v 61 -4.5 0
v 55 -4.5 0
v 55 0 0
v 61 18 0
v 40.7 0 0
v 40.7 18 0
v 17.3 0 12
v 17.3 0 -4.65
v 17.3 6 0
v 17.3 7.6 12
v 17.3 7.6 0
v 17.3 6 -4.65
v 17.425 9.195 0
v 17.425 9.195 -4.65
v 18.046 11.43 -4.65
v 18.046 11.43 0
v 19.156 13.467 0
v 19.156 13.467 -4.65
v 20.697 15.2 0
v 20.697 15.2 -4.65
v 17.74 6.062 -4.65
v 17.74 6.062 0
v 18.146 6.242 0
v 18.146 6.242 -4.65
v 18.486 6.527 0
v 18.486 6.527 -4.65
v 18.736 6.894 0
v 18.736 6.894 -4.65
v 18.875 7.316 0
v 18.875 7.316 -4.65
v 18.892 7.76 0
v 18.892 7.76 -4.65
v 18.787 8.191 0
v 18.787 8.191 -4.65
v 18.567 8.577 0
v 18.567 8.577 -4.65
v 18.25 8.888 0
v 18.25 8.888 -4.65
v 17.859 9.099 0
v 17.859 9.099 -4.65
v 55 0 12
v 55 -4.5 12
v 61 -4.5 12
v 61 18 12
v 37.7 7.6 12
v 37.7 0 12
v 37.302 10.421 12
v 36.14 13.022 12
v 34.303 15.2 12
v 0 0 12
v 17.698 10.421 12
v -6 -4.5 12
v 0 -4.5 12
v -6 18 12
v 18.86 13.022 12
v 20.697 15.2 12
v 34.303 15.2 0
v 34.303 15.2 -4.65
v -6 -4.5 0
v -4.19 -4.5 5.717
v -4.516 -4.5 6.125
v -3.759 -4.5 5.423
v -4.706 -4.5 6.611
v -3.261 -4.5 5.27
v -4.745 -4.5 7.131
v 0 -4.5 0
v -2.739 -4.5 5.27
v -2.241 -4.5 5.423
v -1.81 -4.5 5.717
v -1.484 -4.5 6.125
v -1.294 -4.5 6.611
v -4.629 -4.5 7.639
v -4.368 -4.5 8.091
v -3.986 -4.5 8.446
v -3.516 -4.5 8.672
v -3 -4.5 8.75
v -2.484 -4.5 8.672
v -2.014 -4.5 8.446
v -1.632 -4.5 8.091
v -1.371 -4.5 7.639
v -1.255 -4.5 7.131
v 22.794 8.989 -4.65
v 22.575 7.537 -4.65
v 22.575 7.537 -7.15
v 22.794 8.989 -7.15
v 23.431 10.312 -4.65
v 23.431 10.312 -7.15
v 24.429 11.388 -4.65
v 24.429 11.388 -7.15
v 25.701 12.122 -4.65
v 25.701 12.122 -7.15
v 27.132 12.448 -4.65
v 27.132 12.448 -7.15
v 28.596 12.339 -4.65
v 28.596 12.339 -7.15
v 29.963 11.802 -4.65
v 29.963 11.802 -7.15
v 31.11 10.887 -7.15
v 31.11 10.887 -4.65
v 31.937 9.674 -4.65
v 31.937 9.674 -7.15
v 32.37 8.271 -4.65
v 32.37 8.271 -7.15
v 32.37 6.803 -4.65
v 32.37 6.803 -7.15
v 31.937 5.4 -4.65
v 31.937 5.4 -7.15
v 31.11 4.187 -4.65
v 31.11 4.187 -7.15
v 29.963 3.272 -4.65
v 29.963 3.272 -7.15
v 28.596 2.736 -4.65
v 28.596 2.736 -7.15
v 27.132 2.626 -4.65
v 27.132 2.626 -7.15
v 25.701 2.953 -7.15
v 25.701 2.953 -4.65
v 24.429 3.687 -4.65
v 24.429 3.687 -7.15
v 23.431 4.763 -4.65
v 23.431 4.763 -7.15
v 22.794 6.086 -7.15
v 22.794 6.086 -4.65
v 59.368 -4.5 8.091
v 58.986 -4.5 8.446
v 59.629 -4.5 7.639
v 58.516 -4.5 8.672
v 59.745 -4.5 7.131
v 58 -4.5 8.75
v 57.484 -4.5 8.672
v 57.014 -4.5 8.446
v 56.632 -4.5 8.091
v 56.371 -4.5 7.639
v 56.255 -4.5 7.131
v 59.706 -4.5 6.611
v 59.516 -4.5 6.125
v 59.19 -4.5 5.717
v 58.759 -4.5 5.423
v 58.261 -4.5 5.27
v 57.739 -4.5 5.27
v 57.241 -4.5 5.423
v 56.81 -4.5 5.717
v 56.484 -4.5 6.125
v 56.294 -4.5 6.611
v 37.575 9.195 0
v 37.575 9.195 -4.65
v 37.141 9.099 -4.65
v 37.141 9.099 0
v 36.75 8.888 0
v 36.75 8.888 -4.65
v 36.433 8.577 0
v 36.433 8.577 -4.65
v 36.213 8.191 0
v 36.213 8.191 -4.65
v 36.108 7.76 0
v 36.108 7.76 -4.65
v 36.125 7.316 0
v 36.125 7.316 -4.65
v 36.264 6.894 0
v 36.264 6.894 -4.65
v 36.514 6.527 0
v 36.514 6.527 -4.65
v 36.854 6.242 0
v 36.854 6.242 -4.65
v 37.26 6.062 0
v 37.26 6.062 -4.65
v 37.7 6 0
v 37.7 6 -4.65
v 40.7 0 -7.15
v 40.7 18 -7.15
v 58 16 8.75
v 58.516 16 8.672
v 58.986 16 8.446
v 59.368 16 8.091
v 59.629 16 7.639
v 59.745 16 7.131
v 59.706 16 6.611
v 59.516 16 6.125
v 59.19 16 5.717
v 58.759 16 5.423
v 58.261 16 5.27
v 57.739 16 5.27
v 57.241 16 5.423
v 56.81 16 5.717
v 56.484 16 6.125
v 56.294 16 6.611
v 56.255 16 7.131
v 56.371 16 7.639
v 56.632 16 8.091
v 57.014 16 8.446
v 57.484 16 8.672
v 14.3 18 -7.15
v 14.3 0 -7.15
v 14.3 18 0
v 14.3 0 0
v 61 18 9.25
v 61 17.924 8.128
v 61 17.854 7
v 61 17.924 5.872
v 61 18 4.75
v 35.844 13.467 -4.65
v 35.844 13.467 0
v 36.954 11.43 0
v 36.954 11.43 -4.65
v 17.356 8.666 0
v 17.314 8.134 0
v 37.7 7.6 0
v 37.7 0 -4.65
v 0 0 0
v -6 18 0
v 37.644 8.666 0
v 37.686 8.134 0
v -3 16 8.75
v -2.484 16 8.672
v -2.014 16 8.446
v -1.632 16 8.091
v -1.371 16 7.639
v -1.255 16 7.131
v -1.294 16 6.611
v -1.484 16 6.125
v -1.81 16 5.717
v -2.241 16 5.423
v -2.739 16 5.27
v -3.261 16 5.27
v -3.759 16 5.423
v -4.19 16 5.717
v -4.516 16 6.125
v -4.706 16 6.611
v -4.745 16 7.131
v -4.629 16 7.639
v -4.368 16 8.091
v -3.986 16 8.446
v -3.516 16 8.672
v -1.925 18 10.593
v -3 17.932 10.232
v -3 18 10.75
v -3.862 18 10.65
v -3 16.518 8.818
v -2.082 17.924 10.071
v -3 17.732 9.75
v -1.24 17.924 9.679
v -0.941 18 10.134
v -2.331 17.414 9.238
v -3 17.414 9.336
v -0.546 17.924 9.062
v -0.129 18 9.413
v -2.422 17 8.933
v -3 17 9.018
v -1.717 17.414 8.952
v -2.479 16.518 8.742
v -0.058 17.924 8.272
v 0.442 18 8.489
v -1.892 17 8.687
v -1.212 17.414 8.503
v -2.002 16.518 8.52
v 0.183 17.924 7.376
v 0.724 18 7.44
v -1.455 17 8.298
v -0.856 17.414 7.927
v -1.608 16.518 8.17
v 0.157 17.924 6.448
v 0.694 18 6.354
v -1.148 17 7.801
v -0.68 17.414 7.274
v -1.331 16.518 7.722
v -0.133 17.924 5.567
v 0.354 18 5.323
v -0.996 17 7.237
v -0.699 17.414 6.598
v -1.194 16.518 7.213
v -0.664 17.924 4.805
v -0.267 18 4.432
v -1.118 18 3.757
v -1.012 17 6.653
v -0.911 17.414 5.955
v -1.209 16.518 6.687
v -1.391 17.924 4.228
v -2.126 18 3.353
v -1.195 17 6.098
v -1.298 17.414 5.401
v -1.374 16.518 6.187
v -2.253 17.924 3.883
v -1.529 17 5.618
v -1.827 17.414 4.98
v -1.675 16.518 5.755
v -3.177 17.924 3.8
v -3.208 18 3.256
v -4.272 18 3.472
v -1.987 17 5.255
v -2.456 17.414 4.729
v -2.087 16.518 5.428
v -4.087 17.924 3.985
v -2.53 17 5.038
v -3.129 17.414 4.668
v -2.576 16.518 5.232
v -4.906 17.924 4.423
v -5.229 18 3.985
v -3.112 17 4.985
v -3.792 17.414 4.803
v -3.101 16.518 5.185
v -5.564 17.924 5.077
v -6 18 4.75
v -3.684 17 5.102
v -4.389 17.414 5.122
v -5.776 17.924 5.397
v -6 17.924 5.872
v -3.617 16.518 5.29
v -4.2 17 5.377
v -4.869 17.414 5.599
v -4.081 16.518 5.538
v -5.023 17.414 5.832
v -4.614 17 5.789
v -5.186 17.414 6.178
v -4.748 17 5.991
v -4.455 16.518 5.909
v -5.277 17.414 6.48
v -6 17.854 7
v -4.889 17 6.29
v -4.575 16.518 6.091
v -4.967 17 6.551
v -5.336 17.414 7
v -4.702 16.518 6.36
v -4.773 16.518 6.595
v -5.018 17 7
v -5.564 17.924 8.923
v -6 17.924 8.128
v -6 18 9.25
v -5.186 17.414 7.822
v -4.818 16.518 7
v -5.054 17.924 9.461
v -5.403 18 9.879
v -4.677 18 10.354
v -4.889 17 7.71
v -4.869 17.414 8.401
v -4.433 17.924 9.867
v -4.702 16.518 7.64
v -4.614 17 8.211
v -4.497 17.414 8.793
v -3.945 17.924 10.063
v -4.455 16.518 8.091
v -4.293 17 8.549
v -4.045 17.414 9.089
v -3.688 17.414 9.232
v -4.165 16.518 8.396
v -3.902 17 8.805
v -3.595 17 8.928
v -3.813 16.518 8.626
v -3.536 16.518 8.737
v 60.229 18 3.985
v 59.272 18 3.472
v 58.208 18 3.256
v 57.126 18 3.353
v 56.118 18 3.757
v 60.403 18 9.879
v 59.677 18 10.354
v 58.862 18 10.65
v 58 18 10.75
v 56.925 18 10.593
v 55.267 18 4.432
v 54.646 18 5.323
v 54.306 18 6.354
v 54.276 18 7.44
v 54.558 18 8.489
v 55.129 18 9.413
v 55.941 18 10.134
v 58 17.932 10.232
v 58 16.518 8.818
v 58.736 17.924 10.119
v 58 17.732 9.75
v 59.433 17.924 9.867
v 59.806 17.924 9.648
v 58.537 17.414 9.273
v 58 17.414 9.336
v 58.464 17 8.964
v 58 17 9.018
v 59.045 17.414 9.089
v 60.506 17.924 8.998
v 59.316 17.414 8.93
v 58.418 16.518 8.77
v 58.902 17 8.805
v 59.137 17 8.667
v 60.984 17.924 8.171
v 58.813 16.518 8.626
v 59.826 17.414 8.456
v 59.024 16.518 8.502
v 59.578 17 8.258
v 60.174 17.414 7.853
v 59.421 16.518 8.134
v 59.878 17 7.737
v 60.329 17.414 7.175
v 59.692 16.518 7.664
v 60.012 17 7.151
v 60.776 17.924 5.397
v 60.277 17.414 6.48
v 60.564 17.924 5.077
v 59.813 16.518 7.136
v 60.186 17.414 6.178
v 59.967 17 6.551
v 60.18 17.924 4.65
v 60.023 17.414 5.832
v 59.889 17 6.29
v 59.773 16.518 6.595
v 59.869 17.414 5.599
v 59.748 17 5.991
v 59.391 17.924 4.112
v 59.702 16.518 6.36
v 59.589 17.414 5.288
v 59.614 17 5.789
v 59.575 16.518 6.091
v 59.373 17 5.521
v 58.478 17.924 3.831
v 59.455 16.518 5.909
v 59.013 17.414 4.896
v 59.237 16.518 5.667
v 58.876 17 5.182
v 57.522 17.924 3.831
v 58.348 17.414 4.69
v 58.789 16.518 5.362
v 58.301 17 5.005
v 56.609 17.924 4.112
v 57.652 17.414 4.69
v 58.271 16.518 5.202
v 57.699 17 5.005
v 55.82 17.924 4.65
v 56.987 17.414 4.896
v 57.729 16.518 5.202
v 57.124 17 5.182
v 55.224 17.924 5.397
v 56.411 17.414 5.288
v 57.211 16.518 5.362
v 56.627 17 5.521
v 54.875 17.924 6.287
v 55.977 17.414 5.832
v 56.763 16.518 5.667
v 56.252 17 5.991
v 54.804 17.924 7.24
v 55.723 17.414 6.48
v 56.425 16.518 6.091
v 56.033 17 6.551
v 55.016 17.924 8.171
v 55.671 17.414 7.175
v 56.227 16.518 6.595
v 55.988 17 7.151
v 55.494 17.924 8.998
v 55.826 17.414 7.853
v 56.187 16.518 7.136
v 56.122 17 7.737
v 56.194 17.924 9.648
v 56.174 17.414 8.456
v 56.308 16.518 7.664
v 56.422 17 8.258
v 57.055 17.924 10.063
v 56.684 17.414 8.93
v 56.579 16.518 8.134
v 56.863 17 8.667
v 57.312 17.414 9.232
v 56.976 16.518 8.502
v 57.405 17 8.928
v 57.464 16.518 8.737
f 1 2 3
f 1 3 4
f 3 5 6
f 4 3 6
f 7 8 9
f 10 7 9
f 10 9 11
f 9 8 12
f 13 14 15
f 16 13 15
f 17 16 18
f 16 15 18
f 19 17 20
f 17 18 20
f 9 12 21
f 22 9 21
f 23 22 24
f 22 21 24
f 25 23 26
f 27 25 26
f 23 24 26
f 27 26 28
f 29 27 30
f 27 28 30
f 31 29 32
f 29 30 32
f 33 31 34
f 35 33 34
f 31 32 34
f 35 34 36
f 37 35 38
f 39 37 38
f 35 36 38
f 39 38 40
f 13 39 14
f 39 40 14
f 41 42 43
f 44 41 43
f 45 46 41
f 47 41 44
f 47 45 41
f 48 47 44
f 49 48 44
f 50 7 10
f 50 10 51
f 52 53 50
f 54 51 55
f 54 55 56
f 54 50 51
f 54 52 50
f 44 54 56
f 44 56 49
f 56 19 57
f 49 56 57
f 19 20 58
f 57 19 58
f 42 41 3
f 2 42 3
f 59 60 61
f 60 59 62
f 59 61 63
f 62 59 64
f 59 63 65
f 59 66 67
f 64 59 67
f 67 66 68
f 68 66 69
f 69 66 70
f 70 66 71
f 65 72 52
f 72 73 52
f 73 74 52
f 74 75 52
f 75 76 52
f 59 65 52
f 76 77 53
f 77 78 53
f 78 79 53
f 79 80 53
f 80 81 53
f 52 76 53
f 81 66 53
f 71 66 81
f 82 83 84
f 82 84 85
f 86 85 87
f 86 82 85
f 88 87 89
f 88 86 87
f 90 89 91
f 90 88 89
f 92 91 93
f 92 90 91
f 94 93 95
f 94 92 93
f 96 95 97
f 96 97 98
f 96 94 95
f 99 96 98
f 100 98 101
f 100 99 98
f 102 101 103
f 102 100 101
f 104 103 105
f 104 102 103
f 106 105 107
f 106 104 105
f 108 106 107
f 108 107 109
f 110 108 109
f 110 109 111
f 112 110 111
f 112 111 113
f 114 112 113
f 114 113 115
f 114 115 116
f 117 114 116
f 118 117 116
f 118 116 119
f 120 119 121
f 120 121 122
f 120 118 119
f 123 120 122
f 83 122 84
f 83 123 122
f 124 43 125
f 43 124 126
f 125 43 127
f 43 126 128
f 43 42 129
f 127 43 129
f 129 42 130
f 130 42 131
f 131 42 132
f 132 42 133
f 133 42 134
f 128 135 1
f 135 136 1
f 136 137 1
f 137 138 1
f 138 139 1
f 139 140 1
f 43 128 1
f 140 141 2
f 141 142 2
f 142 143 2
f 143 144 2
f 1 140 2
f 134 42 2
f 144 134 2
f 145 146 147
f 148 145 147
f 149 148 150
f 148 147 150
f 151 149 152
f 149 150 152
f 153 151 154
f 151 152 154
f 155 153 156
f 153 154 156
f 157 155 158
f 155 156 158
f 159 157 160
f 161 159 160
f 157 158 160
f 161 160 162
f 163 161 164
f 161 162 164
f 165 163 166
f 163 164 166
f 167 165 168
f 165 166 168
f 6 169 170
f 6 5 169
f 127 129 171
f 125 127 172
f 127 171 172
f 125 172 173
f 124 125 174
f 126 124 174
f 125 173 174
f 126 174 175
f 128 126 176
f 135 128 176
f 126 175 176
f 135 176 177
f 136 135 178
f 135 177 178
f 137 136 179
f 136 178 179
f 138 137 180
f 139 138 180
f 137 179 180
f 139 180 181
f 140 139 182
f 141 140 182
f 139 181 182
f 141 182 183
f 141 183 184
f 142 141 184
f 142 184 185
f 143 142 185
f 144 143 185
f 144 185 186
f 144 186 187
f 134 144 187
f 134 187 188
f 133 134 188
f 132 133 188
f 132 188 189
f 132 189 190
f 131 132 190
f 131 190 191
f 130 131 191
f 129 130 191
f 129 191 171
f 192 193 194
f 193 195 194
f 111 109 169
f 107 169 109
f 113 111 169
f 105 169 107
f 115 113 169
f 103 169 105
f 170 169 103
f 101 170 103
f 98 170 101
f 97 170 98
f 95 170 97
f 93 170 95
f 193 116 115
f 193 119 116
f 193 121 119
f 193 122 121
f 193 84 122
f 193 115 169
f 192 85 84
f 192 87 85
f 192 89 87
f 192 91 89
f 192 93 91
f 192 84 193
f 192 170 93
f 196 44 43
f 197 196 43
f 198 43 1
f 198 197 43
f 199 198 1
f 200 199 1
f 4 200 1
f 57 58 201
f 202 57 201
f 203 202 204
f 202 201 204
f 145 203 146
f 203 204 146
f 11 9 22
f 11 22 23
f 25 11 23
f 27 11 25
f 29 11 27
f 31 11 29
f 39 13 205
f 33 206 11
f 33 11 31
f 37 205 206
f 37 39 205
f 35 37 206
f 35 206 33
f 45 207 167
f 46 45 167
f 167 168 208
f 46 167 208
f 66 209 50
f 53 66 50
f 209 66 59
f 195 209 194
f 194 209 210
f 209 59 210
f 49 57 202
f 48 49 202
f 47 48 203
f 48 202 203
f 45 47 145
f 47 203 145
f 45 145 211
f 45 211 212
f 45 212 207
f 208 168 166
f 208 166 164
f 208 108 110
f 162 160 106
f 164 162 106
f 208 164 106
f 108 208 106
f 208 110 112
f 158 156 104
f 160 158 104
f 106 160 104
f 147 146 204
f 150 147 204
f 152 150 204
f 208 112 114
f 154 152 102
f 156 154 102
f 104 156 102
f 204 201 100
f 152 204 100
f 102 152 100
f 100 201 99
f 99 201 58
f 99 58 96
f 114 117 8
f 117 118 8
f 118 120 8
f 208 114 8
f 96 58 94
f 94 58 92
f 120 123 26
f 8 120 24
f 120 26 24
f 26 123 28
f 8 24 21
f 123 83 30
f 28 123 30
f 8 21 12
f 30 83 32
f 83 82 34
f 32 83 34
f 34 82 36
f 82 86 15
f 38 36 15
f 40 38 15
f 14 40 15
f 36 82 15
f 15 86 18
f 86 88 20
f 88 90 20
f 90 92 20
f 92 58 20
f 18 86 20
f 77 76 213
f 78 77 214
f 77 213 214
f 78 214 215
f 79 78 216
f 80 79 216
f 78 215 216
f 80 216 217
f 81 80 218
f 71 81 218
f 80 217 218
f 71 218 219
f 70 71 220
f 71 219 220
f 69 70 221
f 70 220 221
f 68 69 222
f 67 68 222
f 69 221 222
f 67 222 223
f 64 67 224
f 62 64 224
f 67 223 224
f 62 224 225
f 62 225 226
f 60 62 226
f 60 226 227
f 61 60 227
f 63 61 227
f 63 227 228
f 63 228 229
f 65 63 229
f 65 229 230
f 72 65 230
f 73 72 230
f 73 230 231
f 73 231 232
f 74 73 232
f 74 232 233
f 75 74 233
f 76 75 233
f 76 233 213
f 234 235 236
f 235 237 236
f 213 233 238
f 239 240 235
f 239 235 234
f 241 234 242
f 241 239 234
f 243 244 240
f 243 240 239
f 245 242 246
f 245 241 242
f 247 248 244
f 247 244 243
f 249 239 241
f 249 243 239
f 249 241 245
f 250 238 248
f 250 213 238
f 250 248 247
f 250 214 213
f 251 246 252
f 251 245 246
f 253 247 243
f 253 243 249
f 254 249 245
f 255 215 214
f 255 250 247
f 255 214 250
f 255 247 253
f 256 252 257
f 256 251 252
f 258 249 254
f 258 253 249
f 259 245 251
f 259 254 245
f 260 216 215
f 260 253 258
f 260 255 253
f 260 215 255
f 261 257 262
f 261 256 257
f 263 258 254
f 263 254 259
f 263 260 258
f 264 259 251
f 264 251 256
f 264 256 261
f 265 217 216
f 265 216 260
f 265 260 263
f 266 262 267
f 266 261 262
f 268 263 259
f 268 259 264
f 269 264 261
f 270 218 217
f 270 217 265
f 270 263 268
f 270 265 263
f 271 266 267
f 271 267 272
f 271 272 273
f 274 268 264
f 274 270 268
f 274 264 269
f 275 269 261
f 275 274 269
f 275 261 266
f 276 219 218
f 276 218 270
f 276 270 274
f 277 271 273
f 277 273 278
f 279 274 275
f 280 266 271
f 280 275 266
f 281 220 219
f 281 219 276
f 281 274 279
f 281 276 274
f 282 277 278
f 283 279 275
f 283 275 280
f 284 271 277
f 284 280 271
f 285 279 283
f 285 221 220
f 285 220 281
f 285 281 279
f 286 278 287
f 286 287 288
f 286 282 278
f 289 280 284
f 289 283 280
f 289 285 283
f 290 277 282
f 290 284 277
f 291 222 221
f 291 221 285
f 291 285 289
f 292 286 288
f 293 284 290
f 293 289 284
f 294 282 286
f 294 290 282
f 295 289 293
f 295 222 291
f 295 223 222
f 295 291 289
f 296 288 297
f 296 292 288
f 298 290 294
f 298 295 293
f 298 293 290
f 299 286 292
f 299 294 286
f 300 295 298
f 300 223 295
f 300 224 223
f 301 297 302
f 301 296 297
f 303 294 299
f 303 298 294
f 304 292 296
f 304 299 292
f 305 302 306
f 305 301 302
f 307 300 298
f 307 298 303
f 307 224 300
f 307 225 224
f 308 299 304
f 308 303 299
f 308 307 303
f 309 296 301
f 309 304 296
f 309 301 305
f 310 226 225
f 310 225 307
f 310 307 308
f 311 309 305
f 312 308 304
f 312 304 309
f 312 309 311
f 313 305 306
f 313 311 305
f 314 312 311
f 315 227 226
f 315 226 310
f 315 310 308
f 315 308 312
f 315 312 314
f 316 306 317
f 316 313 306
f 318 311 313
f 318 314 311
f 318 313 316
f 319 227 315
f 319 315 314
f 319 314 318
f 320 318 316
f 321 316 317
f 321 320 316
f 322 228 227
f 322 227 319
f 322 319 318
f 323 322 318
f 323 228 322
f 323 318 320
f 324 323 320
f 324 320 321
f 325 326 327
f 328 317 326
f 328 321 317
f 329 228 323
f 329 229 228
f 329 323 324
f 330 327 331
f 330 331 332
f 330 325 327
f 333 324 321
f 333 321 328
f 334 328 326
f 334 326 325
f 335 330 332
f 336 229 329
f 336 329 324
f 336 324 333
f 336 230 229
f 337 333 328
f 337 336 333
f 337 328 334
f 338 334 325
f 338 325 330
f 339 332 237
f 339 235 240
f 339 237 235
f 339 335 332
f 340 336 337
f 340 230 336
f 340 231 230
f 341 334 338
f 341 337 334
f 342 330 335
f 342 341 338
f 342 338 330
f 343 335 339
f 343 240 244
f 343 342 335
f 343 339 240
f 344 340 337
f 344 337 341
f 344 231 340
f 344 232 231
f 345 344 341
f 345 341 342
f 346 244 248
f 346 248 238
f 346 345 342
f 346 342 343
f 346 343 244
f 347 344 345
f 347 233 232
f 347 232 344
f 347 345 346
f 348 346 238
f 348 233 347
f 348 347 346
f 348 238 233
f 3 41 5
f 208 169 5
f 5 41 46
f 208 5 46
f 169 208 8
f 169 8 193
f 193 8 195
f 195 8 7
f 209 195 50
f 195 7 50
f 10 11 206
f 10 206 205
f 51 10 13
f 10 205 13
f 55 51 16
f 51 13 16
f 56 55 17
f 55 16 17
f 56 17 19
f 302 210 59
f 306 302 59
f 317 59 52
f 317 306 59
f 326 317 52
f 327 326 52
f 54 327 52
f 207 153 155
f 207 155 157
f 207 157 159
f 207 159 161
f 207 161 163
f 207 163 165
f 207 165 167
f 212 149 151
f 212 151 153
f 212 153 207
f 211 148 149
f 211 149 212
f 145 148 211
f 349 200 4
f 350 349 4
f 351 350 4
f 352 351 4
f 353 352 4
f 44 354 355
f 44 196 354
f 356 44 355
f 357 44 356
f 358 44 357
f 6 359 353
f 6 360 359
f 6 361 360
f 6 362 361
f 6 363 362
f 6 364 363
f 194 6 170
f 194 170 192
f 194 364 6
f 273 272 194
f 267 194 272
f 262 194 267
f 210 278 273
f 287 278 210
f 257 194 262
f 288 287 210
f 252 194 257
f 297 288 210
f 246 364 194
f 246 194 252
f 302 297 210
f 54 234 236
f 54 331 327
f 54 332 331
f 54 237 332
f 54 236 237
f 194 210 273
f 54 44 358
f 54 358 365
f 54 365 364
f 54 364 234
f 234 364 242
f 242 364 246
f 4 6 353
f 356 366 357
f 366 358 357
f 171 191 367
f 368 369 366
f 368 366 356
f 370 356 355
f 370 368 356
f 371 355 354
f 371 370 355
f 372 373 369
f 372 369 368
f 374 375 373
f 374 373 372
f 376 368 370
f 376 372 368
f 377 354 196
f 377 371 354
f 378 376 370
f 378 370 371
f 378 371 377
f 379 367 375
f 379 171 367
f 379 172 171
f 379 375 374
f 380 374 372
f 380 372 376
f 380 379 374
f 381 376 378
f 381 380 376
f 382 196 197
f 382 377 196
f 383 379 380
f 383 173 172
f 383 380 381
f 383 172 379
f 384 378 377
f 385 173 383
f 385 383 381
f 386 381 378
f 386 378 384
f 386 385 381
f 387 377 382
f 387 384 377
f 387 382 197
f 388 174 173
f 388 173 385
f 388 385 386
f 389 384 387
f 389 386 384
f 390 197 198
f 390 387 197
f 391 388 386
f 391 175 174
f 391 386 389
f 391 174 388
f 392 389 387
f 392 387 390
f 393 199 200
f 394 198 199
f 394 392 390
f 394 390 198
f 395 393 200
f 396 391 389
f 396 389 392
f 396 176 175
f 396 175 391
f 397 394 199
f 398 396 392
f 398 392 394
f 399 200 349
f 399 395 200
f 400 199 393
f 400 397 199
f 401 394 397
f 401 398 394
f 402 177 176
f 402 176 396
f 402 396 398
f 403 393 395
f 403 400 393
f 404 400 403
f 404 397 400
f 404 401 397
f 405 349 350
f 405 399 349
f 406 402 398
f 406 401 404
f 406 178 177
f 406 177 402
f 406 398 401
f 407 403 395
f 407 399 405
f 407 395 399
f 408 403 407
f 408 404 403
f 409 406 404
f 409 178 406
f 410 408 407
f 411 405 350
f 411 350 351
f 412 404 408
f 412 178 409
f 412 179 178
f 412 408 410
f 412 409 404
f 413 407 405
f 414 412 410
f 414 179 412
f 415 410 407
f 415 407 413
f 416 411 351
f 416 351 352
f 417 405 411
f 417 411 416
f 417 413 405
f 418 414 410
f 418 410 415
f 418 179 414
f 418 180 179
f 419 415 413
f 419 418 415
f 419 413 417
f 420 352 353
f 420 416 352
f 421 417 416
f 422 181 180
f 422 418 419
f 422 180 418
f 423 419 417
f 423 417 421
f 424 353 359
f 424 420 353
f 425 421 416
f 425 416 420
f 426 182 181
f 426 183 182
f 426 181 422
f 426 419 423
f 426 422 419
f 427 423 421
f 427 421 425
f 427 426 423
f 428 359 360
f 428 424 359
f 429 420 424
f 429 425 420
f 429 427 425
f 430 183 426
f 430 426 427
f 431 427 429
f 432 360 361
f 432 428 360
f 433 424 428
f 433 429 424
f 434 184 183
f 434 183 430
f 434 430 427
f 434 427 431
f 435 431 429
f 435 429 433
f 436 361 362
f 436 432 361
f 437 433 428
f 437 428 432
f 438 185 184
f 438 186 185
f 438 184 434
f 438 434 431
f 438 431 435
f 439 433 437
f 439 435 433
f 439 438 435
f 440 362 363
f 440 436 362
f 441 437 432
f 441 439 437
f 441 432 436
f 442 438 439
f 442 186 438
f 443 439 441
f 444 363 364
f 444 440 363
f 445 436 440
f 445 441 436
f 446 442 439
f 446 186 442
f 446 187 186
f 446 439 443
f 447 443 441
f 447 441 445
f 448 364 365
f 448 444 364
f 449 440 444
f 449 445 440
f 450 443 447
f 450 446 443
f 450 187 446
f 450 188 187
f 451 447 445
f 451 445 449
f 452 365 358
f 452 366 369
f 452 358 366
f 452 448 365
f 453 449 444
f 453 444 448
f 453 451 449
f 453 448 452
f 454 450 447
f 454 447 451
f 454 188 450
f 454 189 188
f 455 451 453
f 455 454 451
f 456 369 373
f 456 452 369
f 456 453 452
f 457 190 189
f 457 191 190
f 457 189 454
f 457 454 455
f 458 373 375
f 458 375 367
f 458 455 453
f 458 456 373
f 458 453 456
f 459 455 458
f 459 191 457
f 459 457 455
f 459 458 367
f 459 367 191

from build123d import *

# Parameters (mm, degrees)
BOSS_EXTRUDE2_DEPTH = 12
SKETCH2_W           = 12
SKETCH2_H           = 22.5
BOSS_EXTRUDE3_DEPTH = 6
SKETCH3_W           = 12
SKETCH3_H           = 22.5
BOSS_EXTRUDE4_DEPTH = 6
SKETCH4_R           = 1.75
CUT_EXTRUDE1_DEPTH  = 22.5
FILLET1_R           = 2
BOSS_EXTRUDE5_START = 4.65
BOSS_EXTRUDE5_DEPTH = 4.65
SKETCH6_W           = 26.4
SKETCH6_H           = 18
SKETCH6_R           = 4.925
BOSS_EXTRUDE6_DEPTH = 2.5


with BuildPart() as part:
    # Sketch1 → Boss-Extrude2 (new body)
    with BuildSketch(Plane.XY):
        Polygon((0, 18), (0, 0), (17.3, 0), (17.3, 7.6), (17.3, 15.2), (20.697059459, 15.2), (34.302940541, 15.2), (37.7, 15.2), (37.7, 7.6), (37.7, 0), (55, 0), (55, 18), align=None)
        with BuildLine():
            Line((17.3, 15.2), (17.3, 7.6))
            ThreePointArc((17.3, 7.6), (18.187911257, 11.762331467), (20.697059459, 15.2))
            Line((20.697059459, 15.2), (17.3, 15.2))
        make_face()
        with BuildLine():
            Line((37.7, 15.2), (34.302940541, 15.2))
            ThreePointArc((34.302940541, 15.2), (36.812088743, 11.762331467), (37.7, 7.6))
            Line((37.7, 7.6), (37.7, 15.2))
        make_face()
    extrude(amount=BOSS_EXTRUDE2_DEPTH)

    # Sketch2 → Boss-Extrude3 (add)
    with BuildSketch(Plane.ZY):
        with Locations((6, 6.75)):
            Rectangle(SKETCH2_W, SKETCH2_H)
    extrude(amount=BOSS_EXTRUDE3_DEPTH)

    # Sketch3 → Boss-Extrude4 (add)
    with BuildSketch(Plane(origin=(55, 0, 0), x_dir=(0, 0, -1), z_dir=(1, 0, 0))):
        with Locations((-6, 6.75)):
            Rectangle(SKETCH3_W, SKETCH3_H)
    extrude(amount=BOSS_EXTRUDE4_DEPTH)

    # Sketch4 → Cut-Extrude1 (cut)
    with BuildSketch(Plane(origin=(0, 18, 0), x_dir=(1, 0, 0), z_dir=(0, 1, 0))):
        with Locations(Location((-3, -7, 0), (0, 0, 270))):
            Circle(SKETCH4_R)
        with Locations(Location((58, -7, 0), (0, 0, 270))):
            Circle(SKETCH4_R)
    extrude(amount=-CUT_EXTRUDE1_DEPTH, mode=Mode.SUBTRACT)

    # Fillet1
    # the kernel refuses this fillet: 2 mm, written as the material it takes off along each edge
    with BuildSketch(Plane(origin=(-3, 18, 7), x_dir=(0, 0, 1), z_dir=(-1, 0, 0))) as fillet1_piece_1:
        with BuildLine():
            CenterArc((1.75 + FILLET1_R, -FILLET1_R), FILLET1_R, 90, 90)
            Line((1.75, -FILLET1_R), (1.75, 0))
            Line((1.75, 0), (1.75 + FILLET1_R, 0))
        make_face()
    revolve(axis=Axis((-3, 18, 7), (0, 1, 0)), mode=Mode.SUBTRACT)
    with BuildSketch(Plane(origin=(58, 18, 7), x_dir=(0, 0, 1), z_dir=(-1, 0, 0))) as fillet1_piece_2:
        with BuildLine():
            CenterArc((1.75 + FILLET1_R, -FILLET1_R), FILLET1_R, 90, 90)
            Line((1.75, -FILLET1_R), (1.75, 0))
            Line((1.75, 0), (1.75 + FILLET1_R, 0))
        make_face()
    revolve(axis=Axis((58, 18, 7), (0, 1, 0)), mode=Mode.SUBTRACT)

    # Sketch5 → Boss-Extrude5 (add)
    with BuildSketch(Plane(origin=(0, 0, 0), x_dir=(-1, 0, 0), z_dir=(0, 0, -1)).offset(BOSS_EXTRUDE5_START)):
        with BuildLine():
            Line((-37.7, 0), (-40.7, 0))
            Line((-40.7, 0), (-40.7, 18))
            Line((-40.7, 18), (-14.3, 18))
            Line((-14.3, 18), (-14.3, 0))
            Line((-14.3, 0), (-17.3, 0))
            Line((-17.3, 0), (-17.3, 6))
            ThreePointArc((-17.3, 6), (-18.898767331, 7.537206525), (-17.425490196, 9.195071224))
            ThreePointArc((-17.425490196, 9.195071224), (-18.543054375, 12.47986937), (-20.697059459, 15.2))
            Line((-20.697059459, 15.2), (-34.302940541, 15.2))
            ThreePointArc((-34.302940541, 15.2), (-36.456945625, 12.47986937), (-37.574509804, 9.195071224))
            ThreePointArc((-37.574509804, 9.195071224), (-36.101232669, 7.537206525), (-37.7, 6))
            Line((-37.7, 6), (-37.7, 0))
        make_face()
    extrude(amount=-BOSS_EXTRUDE5_DEPTH)

    # Sketch6 → Boss-Extrude6 (add)
    with BuildSketch(Plane(origin=(0, 0, -4.65), x_dir=(-1, 0, 0), z_dir=(0, 0, -1))):
        with Locations((-27.5, 9)):
            Rectangle(SKETCH6_W, SKETCH6_H)
        with Locations((-27.5, 7.537206525)):
            Circle(SKETCH6_R, mode=Mode.SUBTRACT)
    extrude(amount=BOSS_EXTRUDE6_DEPTH)


solid = part.part
